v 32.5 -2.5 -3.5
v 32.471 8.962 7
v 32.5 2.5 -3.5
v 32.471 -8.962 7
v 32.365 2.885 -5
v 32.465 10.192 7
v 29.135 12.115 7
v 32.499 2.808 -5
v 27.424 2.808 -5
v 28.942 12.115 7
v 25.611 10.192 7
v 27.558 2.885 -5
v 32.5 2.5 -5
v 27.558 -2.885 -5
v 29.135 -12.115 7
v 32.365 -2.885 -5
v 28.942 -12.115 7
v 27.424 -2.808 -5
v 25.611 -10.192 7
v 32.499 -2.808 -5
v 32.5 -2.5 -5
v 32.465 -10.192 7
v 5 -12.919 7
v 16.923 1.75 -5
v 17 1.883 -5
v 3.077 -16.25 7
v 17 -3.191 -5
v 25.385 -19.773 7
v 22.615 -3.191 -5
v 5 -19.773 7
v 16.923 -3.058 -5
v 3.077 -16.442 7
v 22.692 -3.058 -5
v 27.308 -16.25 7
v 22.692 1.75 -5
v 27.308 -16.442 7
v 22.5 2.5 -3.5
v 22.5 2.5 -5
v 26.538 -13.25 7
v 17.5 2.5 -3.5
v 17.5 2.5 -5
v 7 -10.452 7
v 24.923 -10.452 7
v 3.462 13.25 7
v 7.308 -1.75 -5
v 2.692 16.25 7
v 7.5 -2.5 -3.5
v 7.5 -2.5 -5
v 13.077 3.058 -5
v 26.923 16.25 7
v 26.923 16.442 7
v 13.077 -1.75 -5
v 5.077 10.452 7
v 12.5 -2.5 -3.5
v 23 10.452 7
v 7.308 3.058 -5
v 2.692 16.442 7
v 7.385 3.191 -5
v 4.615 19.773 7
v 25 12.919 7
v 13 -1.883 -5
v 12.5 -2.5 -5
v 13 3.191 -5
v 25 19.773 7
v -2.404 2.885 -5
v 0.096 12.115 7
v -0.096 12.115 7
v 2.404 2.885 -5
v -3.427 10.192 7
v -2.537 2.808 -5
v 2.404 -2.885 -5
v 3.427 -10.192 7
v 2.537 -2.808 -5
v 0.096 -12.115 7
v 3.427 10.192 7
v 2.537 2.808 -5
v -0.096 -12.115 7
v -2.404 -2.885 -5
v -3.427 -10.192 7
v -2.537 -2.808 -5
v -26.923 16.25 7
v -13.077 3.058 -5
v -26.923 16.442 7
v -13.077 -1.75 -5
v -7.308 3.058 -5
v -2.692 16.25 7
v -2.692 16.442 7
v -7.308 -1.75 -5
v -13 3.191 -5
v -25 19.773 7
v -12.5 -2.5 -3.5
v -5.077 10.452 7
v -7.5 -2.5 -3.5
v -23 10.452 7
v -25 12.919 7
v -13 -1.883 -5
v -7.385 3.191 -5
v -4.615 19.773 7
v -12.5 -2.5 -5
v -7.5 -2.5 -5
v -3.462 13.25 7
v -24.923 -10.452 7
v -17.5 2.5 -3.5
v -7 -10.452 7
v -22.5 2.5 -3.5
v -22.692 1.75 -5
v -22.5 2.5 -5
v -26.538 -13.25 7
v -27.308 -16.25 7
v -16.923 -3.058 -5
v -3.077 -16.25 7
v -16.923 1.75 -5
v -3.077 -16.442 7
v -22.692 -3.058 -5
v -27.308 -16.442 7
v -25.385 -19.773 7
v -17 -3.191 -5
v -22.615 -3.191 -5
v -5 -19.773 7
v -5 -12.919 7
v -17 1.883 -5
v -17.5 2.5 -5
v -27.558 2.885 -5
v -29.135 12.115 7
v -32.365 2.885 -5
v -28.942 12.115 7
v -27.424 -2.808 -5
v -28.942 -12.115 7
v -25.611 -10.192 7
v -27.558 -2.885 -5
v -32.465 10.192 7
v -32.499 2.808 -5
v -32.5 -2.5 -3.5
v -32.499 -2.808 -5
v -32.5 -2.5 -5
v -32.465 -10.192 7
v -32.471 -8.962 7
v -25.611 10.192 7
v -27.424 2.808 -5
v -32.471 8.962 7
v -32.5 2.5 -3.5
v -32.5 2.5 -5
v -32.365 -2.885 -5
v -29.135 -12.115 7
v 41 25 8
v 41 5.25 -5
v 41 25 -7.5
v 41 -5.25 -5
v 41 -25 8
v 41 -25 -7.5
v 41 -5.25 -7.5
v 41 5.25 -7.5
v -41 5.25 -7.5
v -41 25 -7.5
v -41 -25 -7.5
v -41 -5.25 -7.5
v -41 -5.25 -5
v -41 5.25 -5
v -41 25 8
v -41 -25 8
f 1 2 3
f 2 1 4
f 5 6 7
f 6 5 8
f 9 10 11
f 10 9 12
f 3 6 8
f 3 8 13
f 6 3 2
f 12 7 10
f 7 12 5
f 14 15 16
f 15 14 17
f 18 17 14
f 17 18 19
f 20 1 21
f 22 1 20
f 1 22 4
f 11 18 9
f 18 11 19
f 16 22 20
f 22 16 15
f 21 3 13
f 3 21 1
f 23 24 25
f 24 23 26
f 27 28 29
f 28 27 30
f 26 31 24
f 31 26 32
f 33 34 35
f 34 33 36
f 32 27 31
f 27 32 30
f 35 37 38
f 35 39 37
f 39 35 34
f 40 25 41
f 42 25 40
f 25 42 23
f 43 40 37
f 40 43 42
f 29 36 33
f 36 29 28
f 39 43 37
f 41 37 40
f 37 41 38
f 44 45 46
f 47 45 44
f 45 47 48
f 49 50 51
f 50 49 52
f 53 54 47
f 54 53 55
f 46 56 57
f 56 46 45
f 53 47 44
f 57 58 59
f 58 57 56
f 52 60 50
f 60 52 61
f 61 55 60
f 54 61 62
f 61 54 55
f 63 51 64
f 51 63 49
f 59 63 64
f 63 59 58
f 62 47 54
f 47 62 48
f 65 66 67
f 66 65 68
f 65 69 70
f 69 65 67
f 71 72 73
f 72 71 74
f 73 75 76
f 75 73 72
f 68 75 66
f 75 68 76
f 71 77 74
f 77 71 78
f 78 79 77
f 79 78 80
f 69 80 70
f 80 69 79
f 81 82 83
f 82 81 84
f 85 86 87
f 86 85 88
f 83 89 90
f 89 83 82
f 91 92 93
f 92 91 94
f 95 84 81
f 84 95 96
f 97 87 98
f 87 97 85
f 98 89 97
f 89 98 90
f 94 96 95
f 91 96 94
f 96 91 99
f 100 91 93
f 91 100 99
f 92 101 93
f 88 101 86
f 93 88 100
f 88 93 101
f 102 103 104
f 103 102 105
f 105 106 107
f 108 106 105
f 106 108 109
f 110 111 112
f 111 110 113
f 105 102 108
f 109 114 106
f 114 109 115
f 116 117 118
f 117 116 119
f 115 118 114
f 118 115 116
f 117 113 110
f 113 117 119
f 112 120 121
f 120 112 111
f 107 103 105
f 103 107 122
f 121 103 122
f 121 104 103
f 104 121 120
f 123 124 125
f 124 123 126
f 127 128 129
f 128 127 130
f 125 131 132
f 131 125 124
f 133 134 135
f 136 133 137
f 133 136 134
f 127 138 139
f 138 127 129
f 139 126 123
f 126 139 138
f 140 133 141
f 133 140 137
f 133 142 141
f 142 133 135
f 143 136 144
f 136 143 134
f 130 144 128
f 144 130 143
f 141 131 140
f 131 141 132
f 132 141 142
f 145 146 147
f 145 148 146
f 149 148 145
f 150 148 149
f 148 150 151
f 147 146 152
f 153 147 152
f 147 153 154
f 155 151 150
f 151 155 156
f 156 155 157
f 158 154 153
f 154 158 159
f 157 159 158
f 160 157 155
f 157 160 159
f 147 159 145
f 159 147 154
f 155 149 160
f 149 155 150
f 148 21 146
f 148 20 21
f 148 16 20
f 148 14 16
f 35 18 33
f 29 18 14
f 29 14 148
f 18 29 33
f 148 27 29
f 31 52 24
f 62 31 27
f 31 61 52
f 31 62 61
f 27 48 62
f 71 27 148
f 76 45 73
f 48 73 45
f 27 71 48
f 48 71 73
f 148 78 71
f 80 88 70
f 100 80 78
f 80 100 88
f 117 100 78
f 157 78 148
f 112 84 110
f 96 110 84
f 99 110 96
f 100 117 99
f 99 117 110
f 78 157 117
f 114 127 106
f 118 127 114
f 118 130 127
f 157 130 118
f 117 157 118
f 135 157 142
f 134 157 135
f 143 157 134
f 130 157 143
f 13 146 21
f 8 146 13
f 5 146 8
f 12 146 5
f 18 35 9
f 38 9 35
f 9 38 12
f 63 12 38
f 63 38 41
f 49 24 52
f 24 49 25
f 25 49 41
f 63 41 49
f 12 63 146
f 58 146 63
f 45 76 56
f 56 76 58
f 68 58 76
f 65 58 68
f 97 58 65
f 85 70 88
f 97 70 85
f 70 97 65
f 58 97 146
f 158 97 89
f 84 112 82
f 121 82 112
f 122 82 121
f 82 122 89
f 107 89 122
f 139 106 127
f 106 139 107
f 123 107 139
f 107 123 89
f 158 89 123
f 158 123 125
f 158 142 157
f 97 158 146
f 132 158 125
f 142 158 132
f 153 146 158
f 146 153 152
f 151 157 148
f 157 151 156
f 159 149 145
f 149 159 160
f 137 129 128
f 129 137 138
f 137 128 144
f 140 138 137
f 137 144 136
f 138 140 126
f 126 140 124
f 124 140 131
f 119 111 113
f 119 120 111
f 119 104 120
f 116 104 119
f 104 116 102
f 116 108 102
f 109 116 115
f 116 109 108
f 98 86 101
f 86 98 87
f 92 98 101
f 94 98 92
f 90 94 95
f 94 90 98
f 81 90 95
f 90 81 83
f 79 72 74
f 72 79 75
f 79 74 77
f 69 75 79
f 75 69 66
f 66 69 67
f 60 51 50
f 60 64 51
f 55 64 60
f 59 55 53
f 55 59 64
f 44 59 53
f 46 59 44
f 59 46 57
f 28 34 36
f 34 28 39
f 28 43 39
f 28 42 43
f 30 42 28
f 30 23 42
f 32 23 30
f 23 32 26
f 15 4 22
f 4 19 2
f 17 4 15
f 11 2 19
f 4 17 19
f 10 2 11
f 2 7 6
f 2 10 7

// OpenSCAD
// WS2812 LED Strip Parameters - verified measurements
led_spacing = 10;      // 10mm between LED centers
strip_width = 10;      // 10mm wide LED strip
strip_height = 2;      // Keep same
tolerance = 0.5;       // Keep same
led_size = 5;         // 5mm square LED cutouts

// Updated Base Parameters
base_width = 82;      // Optimized smaller base
base_length = 50;     // Adjusted proportionally
base_height = 15;     // Increased by 25% from 25mm

// Updated 7-Segment Display Parameters
segment_h_length = 25;    // Increased horizontal length for wider number
segment_width = 8;        // Keep wider segments

// Add diffuser parameters
diffuser_height = 1;

// Define LED positions globally
led1 = [0, -3.0 * led_spacing];  // LED1
led2 = [0,-2.0 * led_spacing];  // LED2
led3 = [0,-1.0 * led_spacing];  // LED3
led4 = [0,0.0 * led_spacing];   // LED4 - Center LED
led5 = [0,1.0 * led_spacing];   // LED5
led6 = [0,2.0 * led_spacing];   // LED6
led7 = [0,3.0 * led_spacing];   // LED7

// Define segment positions globally - Wide and squished
seg_f = [-17, 15];     // F (top left vertical) - moved outward
seg_e = [-17, -15];    // E (bottom left vertical) - moved outward
seg_a = [0, 29];      // A (top horizontal) - same height
seg_g = [0, 0];       // G (middle horizontal) - unchanged
seg_b = [17, 15];      // B (top right vertical) - moved closer
seg_c = [17, -15];     // C (bottom right vertical) - moved closer
seg_d = [0, -29];     // D (bottom horizontal) - moved closer

// LED Strip Channel with wire channels - centered
module led_channel() {
    // Main channel exactly 10mm wide plus tolerance
    translate([-base_width/2 , -strip_width/2 - tolerance/2, -base_height/2])
        cube([base_width, strip_width + tolerance, strip_height + tolerance]);
}

// Single light pipe cavity with elongating shape
module light_cavity(led_pos, segment_pos, is_horizontal=false) {
    // Calculate heights for better progression
    z_bottom = -base_height/2 + strip_height;
    z_top = base_height/2;
    total_height = z_top - z_bottom;
    
    hull() {
        // Bottom (at LED) - small square
        translate([led_pos[0] - led_size/2, led_pos[1] - led_size/2, z_bottom])
            cube([led_size, led_size, 2]);
     
            
        // Top (at segment) - full segment shape
        translate([segment_pos[0], segment_pos[1], z_top]) {
            rotate([0, 0, is_horizontal ? 0 : 90])
                linear_extrude(height=2)
                    segment(segment_h_length, segment_width);
        }
    }
    
}

// All light cavities with corrected segment positions and mirroring
module all_cavities(visualization=false) {
    
    rotate([0, 0, 90]) {
        // Light paths
        light_cavity(led1, seg_d, true);   // LED1 → F (vertical)
        light_cavity(led2, seg_e, false);   // LED2 → E (vertical)
        light_cavity(led3, seg_c, false);    // LED3 → A (horizontal)
        light_cavity(led4, seg_g, true);    // LED4 → G (horizontal)
        light_cavity(led5, seg_b, false);   // LED5 → B (vertical)
        light_cavity(led6, seg_f, false);   // LED6 → C (vertical)
        light_cavity(led7, seg_a, true);    // LED6 → D (horizontal)
    }
}

// Base with LED channel, cavities, 
module base() {
    difference() {
        // Main block
        cube([base_width, base_length, base_height], center=true);             
        // LED channel
        led_channel();
        // Light pipe cavities
        all_cavities(false);  // Use same paths for actual cavities
    }
}

module segment(length, width) {
    // Elongated hexagonal shape
    hull() {
        translate([-length/2 + width/2, 0, 0]) 
            circle(d=width, $fn=6);
        translate([length/2 - width/2, 0, 0])  
            circle(d=width, $fn=6);
    }
}

// Diffuser layer module
module diffuser_layer() {
    color("White", alpha=0.2)  // Semi-transparent to visualize
    translate([0, 0, base_height/2])  // Changed to sit directly on base
        cube([base_width, base_length, diffuser_height], center=true);
}

// Render just the paths in red with slight transparency
//all_cavities(true);  // Show paths
union() {
   base();
   diffuser_layer();
}
   
